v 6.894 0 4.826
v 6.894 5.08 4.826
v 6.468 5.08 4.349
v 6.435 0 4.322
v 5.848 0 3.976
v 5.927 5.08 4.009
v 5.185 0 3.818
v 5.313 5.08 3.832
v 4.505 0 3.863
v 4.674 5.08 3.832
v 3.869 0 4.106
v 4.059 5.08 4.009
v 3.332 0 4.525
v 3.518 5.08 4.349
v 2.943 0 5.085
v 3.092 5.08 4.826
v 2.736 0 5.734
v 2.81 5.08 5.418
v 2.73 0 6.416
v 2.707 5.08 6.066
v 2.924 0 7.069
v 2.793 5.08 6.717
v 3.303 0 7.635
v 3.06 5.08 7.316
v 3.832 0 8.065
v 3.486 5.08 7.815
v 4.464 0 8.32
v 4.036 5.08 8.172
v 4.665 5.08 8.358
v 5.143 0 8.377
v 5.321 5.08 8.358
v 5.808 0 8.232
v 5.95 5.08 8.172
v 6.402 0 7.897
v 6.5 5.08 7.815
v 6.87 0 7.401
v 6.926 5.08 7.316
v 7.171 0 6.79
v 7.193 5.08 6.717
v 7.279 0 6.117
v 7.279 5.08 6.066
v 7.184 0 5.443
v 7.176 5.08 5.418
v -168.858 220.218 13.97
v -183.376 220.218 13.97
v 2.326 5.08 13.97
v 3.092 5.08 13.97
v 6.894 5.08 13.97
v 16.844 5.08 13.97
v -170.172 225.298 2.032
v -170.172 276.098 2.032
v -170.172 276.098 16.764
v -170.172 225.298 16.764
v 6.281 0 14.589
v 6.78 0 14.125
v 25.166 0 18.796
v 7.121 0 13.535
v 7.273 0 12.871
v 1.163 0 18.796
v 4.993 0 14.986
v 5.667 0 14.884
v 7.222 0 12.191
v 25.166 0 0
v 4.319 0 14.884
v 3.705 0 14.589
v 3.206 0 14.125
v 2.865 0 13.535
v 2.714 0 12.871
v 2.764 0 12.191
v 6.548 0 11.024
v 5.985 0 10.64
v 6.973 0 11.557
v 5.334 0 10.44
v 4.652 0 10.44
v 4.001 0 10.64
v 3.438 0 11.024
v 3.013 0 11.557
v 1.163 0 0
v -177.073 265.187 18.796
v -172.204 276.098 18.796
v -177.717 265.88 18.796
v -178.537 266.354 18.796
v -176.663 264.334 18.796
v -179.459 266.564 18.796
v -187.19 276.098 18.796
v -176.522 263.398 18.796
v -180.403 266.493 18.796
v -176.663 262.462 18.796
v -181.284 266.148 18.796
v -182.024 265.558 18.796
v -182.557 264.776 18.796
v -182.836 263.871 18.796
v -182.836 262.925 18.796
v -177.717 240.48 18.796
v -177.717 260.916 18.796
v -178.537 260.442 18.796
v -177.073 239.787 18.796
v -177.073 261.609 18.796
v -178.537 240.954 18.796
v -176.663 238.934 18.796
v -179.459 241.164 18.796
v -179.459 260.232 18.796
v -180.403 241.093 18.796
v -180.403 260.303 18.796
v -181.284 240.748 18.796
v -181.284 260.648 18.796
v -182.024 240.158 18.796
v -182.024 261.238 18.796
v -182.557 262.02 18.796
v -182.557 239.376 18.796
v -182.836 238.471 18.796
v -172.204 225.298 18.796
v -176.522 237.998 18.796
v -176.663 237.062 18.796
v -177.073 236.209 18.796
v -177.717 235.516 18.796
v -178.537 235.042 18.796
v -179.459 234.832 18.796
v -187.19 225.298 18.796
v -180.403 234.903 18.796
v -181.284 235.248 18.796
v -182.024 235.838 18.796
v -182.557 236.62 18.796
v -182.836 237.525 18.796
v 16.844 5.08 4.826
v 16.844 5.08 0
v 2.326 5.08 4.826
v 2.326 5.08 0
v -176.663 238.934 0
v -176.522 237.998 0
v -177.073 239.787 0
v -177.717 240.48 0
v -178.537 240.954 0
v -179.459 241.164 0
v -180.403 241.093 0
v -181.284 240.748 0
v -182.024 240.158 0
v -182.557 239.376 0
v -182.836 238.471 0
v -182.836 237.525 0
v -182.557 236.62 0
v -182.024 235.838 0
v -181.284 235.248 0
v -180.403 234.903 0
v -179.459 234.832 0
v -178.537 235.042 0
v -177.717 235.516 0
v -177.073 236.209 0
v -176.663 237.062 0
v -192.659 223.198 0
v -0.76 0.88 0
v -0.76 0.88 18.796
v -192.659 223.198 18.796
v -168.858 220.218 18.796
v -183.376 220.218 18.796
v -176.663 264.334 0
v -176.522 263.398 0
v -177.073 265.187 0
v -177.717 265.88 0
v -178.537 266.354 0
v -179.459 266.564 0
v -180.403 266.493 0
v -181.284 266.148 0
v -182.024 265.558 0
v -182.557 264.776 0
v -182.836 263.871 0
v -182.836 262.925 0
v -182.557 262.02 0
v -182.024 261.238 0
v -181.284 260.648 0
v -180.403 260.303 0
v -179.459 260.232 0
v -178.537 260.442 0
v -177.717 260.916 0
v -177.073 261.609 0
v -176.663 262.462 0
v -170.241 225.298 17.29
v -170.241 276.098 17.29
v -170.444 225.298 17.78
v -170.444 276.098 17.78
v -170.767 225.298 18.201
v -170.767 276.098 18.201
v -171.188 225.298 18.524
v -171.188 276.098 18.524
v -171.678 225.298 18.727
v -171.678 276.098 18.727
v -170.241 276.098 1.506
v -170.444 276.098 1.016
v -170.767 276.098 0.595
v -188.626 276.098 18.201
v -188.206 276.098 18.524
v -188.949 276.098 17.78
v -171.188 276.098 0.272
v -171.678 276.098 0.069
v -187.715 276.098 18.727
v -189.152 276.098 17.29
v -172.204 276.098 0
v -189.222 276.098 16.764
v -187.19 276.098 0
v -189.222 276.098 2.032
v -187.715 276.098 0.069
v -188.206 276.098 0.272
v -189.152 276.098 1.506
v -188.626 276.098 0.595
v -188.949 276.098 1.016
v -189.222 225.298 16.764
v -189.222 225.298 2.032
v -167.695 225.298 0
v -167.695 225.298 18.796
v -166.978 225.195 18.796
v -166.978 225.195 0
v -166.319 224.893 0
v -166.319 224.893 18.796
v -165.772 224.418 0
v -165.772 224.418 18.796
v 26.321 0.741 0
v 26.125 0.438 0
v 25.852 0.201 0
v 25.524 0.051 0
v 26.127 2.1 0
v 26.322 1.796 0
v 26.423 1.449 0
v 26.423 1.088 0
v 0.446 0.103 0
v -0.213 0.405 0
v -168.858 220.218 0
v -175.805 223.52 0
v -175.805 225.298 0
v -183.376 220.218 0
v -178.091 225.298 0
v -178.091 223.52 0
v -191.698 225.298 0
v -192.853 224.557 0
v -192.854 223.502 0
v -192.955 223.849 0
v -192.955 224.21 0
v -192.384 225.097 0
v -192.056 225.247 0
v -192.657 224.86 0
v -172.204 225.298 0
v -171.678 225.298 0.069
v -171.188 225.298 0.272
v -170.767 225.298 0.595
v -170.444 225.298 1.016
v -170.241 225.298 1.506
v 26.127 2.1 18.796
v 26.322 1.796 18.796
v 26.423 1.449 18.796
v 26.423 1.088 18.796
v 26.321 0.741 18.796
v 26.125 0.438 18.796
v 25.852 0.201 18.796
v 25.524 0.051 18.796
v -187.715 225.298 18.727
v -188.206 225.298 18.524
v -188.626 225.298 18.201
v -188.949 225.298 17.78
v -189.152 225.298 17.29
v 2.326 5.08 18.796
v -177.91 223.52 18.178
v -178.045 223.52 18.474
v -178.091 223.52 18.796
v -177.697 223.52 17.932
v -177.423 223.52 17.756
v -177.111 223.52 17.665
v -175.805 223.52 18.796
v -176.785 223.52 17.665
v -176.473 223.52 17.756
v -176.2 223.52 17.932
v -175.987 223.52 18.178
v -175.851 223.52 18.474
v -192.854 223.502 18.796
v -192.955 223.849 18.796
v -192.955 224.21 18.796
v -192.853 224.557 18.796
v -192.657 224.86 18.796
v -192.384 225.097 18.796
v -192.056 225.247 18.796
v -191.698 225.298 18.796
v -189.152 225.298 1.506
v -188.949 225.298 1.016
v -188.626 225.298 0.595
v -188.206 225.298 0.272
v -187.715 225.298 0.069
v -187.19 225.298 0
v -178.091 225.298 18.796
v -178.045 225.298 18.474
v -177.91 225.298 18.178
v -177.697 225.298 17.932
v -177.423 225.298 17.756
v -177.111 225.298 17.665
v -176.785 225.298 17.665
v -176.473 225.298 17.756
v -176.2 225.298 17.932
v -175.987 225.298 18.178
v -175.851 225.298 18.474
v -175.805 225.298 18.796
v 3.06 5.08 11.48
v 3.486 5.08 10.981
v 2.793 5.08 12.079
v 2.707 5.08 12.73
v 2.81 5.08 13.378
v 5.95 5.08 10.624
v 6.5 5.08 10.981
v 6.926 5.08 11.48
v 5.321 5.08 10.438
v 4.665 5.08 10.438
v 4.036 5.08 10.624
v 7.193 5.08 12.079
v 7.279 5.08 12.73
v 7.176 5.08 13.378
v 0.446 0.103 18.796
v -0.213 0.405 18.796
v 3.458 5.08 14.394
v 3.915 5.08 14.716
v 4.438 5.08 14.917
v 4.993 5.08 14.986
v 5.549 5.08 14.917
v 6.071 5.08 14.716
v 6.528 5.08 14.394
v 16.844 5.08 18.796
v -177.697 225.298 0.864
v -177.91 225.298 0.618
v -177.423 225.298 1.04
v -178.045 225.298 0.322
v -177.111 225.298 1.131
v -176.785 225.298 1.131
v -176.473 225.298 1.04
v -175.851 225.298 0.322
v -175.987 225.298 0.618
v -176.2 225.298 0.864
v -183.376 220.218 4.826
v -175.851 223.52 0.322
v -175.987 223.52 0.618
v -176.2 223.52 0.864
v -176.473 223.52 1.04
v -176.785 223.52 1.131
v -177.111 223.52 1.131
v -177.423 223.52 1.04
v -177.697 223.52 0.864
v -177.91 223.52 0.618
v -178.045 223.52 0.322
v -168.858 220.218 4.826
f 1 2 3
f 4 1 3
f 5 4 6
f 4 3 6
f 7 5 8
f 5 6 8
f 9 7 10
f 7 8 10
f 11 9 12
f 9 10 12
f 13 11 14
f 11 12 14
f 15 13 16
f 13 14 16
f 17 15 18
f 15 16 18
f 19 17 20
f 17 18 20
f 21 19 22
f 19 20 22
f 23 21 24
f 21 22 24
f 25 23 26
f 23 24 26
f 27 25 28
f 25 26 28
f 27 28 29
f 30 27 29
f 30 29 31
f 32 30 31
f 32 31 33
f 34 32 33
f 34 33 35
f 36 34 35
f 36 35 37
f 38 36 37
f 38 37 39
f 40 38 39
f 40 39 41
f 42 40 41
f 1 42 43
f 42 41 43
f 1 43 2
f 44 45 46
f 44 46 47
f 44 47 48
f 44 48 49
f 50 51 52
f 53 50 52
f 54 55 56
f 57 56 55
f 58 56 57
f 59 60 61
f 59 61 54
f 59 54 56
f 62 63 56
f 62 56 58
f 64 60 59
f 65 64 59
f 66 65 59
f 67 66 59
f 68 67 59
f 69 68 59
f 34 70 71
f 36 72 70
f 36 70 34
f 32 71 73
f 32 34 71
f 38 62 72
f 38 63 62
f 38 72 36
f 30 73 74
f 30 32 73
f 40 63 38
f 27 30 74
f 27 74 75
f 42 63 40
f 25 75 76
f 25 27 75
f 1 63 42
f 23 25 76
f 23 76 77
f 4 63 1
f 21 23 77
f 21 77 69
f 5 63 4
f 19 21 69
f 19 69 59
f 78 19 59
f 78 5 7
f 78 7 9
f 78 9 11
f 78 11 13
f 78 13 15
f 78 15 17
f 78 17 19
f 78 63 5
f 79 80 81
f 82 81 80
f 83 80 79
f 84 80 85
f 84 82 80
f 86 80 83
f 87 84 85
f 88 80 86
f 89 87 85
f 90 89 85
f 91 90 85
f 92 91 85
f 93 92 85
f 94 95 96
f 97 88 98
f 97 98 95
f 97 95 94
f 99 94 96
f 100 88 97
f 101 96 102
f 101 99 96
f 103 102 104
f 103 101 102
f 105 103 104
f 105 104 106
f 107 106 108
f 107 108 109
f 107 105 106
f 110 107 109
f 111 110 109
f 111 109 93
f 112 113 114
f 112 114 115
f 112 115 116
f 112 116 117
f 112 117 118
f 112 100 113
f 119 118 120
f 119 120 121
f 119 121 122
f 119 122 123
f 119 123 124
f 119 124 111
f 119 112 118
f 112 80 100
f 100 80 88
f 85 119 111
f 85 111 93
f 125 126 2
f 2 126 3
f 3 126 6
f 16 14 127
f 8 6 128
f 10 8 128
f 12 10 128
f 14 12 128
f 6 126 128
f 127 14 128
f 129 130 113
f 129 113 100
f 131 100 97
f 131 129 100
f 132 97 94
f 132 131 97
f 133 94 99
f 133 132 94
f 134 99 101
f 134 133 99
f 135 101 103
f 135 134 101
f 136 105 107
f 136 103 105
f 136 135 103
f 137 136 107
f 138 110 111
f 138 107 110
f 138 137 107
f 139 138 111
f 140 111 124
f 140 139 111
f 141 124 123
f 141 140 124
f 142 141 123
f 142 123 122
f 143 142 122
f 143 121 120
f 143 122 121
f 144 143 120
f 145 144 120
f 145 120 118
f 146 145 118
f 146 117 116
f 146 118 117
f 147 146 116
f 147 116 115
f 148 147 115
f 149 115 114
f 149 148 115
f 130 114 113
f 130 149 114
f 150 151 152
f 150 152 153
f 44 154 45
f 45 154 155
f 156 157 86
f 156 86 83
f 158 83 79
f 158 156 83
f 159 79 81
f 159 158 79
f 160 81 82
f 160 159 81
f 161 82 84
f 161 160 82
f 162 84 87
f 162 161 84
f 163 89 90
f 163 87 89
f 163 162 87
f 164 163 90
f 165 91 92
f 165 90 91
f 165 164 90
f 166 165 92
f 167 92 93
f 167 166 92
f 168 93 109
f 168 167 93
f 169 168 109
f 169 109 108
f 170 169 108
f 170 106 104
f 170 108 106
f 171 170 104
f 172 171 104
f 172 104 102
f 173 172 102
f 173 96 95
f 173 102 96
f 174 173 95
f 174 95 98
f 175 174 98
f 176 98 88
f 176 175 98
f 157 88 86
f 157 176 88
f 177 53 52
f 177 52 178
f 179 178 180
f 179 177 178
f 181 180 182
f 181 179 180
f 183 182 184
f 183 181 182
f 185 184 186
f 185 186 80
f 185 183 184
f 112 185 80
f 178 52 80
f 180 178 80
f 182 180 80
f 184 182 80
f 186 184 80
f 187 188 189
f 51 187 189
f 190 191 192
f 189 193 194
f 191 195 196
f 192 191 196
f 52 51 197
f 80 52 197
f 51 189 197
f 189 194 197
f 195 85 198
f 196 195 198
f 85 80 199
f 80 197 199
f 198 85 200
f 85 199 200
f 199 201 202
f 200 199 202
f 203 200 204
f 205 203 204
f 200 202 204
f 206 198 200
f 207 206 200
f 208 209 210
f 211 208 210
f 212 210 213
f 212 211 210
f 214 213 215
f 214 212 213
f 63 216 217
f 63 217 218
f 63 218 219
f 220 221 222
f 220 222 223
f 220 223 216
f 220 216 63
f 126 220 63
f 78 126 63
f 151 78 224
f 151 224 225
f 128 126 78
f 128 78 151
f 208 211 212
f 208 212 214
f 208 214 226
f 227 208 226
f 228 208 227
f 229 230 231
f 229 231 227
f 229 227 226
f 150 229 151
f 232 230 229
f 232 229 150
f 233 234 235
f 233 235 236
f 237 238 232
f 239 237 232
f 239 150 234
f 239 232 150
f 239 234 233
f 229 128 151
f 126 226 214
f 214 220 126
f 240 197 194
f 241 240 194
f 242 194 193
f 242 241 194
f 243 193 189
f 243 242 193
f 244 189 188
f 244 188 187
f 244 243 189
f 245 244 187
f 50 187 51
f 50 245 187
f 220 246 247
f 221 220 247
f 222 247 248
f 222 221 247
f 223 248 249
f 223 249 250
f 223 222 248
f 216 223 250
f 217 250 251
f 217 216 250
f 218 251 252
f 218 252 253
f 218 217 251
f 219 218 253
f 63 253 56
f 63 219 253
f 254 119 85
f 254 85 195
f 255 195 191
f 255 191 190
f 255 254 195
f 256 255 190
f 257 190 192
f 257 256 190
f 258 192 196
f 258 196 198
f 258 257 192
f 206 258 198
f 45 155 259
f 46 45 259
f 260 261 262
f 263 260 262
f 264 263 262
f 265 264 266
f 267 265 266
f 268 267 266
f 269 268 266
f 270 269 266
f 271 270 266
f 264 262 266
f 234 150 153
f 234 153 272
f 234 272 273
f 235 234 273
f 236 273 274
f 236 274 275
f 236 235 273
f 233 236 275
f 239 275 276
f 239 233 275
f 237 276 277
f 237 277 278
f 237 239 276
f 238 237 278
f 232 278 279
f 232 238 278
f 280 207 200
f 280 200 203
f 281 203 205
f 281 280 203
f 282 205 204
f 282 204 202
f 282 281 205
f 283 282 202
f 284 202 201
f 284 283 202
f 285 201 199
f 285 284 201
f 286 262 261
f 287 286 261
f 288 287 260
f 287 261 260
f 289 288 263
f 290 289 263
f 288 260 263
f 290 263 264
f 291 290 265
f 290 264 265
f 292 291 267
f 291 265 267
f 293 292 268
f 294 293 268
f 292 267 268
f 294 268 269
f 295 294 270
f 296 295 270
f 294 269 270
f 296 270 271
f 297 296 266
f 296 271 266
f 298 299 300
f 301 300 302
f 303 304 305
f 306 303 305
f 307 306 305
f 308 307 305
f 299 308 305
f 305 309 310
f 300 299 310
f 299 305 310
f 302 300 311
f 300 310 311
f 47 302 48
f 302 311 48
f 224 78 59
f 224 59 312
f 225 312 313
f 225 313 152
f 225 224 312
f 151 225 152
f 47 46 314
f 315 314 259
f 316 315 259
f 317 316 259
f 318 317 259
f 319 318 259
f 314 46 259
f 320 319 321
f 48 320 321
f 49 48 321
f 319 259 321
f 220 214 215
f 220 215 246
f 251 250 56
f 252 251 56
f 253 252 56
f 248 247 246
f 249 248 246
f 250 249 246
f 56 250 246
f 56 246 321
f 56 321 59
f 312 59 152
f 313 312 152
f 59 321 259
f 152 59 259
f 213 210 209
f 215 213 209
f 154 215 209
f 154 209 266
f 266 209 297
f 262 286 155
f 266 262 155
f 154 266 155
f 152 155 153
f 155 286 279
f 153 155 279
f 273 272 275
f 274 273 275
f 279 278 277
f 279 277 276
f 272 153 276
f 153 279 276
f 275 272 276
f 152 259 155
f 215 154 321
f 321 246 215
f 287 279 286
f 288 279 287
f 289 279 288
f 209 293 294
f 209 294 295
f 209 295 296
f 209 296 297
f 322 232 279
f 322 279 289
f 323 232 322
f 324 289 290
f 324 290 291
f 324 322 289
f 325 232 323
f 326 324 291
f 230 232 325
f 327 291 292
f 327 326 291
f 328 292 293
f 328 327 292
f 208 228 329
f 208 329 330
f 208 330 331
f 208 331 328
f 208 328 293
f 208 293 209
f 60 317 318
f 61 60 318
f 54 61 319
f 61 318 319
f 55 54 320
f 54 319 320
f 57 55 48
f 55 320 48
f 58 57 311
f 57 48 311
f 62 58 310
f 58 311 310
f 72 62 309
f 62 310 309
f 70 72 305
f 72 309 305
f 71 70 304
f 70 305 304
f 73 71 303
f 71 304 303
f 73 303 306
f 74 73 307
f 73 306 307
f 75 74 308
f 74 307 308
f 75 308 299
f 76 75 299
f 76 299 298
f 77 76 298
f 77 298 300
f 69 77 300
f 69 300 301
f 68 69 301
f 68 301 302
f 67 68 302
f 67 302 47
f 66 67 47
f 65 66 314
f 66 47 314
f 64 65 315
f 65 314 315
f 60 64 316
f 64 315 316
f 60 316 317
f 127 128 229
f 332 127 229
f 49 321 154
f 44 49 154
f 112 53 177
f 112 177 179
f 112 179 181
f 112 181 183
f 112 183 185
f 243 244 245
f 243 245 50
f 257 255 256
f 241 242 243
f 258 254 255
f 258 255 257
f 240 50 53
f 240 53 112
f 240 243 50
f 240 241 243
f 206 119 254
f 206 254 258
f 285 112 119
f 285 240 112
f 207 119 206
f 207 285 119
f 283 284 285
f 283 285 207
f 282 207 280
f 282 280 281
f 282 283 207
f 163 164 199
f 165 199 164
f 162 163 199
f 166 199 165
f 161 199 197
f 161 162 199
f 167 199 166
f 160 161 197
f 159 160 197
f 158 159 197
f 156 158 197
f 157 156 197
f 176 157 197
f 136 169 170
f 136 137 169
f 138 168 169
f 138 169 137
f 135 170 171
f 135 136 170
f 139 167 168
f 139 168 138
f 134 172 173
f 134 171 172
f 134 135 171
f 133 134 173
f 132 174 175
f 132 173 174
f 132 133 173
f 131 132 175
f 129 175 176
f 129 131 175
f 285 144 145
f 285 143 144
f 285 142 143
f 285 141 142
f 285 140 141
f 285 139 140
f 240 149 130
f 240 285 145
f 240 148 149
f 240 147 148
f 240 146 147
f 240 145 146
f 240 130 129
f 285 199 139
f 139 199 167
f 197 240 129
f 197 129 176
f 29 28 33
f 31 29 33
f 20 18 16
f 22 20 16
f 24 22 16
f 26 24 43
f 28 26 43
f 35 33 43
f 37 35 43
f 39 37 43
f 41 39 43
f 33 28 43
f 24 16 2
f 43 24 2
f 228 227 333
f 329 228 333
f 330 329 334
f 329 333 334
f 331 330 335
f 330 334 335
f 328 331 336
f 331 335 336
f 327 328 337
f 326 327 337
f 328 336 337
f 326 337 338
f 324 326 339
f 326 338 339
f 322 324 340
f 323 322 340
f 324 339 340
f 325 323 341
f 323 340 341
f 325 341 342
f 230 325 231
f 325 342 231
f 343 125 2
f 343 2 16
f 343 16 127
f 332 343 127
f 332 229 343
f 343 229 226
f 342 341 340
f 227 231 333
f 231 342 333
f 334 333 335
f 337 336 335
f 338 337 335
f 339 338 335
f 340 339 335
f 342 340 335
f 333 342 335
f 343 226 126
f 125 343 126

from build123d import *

# Parameters (mm, degrees)
BOSS_EXTRUDE1_DEPTH     = 18.796
CUT_EXTRUDE1_DEPTH      = 4.826
CUT_EXTRUDE2_DEPTH      = 4.826
SKETCH5_R               = 1.143
CUT_EXTRUDE3_DEPTH      = 296.890463183
SKETCH6_R               = 2.286
CUT_EXTRUDE4_DEPTH      = 294.404061537
BOSS_EXTRUDE2_DEPTH     = 50.8
CUT_EXTRUDE5_DEPTH      = 338.372318672
CUT_EXTRUDE5_DEPTH_BACK = 338.372318672
SKETCH10_R              = 3.175


with BuildPart() as part:
    # Sketch1 → Boss-Extrude1 (new body)
    with BuildSketch(Plane.XY):
        with BuildLine():
            Line((-0.759864647, 0.880311666), (-192.659480012, 223.198155833))
            ThreePointArc((-192.659480012, 223.198155833), (-192.85282615, 224.556676606), (-191.698096292, 225.298))
            Line((-191.698096292, 225.298), (-167.694919671, 225.298))
            ThreePointArc((-167.694919671, 225.298), (-166.637566458, 225.067459717), (-165.772152229, 224.417688334))
            Line((-165.772152229, 224.417688334), (26.127463136, 2.099844167))
            ThreePointArc((26.127463136, 2.099844167), (26.320809274, 0.741323394), (25.166079416, 0))
            Line((25.166079416, 0), (1.162902795, 0))
            ThreePointArc((1.162902795, 0), (0.105549582, 0.230540283), (-0.759864647, 0.880311666))
        make_face()
    extrude(amount=BOSS_EXTRUDE1_DEPTH)

    # Sketch3 → Cut-Extrude1 (cut)
    with BuildSketch(Plane.XY.offset(18.796)):
        Polygon((-183.376334539, 220.218), (2.32580559, 5.08), (16.844317663, 5.08), (-168.857822466, 220.218), align=None)
    extrude(amount=-CUT_EXTRUDE1_DEPTH, mode=Mode.SUBTRACT)

    # Sketch4 → Cut-Extrude2 (cut)
    with BuildSketch(Plane(origin=(0, 0, 0), x_dir=(-1, 0, 0), z_dir=(0, 0, -1))):
        Polygon((183.376334539, 220.218), (168.857822466, 220.218), (-16.844317663, 5.08), (-2.32580559, 5.08), align=None)
    extrude(amount=-CUT_EXTRUDE2_DEPTH, mode=Mode.SUBTRACT)

    # Sketch5 → Cut-Extrude3 (cut, through all)
    with BuildSketch(Plane.XZ.offset(-223.52)):
        with Locations((-176.948152229, 0)):
            Circle(SKETCH5_R)
        with Locations((-176.948152229, 18.796)):
            Circle(SKETCH5_R)
    extrude(amount=-CUT_EXTRUDE3_DEPTH, mode=Mode.SUBTRACT)

    # Sketch6 → Cut-Extrude4 (cut, through all)
    with BuildSketch(Plane(origin=(0, 5.08, 0), x_dir=(1, 0, 0), z_dir=(0, 1, 0))):
        with Locations(Location((4.993109193, -12.7, 0), (0, 0, 270))):
            Circle(SKETCH6_R)
        with Locations(Location((4.993109193, -6.096, 0), (0, 0, 33.748988596))):
            Circle(SKETCH6_R)
    extrude(amount=-CUT_EXTRUDE4_DEPTH, mode=Mode.SUBTRACT)


with BuildPart() as body_2:
    # Sketch9 → Boss-Extrude2 (new body)
    with BuildSketch(Plane(origin=(0, 225.298, 0), x_dir=(1, 0, 0), z_dir=(0, 1, 0))):
        with BuildLine():
            Line((-187.189507981, 0), (-172.203507981, 0))
            ThreePointArc((-172.203507981, 0), (-170.766667002, -0.595159021), (-170.171507981, -2.032))
            Line((-170.171507981, -2.032), (-170.171507981, -16.764))
            ThreePointArc((-170.171507981, -16.764), (-170.766667002, -18.200840979), (-172.203507981, -18.796))
            Line((-172.203507981, -18.796), (-187.189507981, -18.796))
            ThreePointArc((-187.189507981, -18.796), (-188.626348961, -18.200840979), (-189.221507981, -16.764))
            Line((-189.221507981, -16.764), (-189.221507981, -2.032))
            ThreePointArc((-189.221507981, -2.032), (-188.626348961, -0.595159021), (-187.189507981, 0))
        make_face()
    extrude(amount=BOSS_EXTRUDE2_DEPTH)

    # Sketch10 → Cut-Extrude5 (cut, two sides: drawn at the far end of the back side and taken through both)
    with BuildSketch(Plane.XY.offset(18.796).offset(-CUT_EXTRUDE5_DEPTH_BACK)):
        with Locations((-179.696507981, 237.998)):
            Circle(SKETCH10_R)
        with Locations((-179.696507981, 263.398)):
            Circle(SKETCH10_R)
    extrude(amount=CUT_EXTRUDE5_DEPTH + CUT_EXTRUDE5_DEPTH_BACK, mode=Mode.SUBTRACT)


solid = Compound([part.part, body_2.part])
